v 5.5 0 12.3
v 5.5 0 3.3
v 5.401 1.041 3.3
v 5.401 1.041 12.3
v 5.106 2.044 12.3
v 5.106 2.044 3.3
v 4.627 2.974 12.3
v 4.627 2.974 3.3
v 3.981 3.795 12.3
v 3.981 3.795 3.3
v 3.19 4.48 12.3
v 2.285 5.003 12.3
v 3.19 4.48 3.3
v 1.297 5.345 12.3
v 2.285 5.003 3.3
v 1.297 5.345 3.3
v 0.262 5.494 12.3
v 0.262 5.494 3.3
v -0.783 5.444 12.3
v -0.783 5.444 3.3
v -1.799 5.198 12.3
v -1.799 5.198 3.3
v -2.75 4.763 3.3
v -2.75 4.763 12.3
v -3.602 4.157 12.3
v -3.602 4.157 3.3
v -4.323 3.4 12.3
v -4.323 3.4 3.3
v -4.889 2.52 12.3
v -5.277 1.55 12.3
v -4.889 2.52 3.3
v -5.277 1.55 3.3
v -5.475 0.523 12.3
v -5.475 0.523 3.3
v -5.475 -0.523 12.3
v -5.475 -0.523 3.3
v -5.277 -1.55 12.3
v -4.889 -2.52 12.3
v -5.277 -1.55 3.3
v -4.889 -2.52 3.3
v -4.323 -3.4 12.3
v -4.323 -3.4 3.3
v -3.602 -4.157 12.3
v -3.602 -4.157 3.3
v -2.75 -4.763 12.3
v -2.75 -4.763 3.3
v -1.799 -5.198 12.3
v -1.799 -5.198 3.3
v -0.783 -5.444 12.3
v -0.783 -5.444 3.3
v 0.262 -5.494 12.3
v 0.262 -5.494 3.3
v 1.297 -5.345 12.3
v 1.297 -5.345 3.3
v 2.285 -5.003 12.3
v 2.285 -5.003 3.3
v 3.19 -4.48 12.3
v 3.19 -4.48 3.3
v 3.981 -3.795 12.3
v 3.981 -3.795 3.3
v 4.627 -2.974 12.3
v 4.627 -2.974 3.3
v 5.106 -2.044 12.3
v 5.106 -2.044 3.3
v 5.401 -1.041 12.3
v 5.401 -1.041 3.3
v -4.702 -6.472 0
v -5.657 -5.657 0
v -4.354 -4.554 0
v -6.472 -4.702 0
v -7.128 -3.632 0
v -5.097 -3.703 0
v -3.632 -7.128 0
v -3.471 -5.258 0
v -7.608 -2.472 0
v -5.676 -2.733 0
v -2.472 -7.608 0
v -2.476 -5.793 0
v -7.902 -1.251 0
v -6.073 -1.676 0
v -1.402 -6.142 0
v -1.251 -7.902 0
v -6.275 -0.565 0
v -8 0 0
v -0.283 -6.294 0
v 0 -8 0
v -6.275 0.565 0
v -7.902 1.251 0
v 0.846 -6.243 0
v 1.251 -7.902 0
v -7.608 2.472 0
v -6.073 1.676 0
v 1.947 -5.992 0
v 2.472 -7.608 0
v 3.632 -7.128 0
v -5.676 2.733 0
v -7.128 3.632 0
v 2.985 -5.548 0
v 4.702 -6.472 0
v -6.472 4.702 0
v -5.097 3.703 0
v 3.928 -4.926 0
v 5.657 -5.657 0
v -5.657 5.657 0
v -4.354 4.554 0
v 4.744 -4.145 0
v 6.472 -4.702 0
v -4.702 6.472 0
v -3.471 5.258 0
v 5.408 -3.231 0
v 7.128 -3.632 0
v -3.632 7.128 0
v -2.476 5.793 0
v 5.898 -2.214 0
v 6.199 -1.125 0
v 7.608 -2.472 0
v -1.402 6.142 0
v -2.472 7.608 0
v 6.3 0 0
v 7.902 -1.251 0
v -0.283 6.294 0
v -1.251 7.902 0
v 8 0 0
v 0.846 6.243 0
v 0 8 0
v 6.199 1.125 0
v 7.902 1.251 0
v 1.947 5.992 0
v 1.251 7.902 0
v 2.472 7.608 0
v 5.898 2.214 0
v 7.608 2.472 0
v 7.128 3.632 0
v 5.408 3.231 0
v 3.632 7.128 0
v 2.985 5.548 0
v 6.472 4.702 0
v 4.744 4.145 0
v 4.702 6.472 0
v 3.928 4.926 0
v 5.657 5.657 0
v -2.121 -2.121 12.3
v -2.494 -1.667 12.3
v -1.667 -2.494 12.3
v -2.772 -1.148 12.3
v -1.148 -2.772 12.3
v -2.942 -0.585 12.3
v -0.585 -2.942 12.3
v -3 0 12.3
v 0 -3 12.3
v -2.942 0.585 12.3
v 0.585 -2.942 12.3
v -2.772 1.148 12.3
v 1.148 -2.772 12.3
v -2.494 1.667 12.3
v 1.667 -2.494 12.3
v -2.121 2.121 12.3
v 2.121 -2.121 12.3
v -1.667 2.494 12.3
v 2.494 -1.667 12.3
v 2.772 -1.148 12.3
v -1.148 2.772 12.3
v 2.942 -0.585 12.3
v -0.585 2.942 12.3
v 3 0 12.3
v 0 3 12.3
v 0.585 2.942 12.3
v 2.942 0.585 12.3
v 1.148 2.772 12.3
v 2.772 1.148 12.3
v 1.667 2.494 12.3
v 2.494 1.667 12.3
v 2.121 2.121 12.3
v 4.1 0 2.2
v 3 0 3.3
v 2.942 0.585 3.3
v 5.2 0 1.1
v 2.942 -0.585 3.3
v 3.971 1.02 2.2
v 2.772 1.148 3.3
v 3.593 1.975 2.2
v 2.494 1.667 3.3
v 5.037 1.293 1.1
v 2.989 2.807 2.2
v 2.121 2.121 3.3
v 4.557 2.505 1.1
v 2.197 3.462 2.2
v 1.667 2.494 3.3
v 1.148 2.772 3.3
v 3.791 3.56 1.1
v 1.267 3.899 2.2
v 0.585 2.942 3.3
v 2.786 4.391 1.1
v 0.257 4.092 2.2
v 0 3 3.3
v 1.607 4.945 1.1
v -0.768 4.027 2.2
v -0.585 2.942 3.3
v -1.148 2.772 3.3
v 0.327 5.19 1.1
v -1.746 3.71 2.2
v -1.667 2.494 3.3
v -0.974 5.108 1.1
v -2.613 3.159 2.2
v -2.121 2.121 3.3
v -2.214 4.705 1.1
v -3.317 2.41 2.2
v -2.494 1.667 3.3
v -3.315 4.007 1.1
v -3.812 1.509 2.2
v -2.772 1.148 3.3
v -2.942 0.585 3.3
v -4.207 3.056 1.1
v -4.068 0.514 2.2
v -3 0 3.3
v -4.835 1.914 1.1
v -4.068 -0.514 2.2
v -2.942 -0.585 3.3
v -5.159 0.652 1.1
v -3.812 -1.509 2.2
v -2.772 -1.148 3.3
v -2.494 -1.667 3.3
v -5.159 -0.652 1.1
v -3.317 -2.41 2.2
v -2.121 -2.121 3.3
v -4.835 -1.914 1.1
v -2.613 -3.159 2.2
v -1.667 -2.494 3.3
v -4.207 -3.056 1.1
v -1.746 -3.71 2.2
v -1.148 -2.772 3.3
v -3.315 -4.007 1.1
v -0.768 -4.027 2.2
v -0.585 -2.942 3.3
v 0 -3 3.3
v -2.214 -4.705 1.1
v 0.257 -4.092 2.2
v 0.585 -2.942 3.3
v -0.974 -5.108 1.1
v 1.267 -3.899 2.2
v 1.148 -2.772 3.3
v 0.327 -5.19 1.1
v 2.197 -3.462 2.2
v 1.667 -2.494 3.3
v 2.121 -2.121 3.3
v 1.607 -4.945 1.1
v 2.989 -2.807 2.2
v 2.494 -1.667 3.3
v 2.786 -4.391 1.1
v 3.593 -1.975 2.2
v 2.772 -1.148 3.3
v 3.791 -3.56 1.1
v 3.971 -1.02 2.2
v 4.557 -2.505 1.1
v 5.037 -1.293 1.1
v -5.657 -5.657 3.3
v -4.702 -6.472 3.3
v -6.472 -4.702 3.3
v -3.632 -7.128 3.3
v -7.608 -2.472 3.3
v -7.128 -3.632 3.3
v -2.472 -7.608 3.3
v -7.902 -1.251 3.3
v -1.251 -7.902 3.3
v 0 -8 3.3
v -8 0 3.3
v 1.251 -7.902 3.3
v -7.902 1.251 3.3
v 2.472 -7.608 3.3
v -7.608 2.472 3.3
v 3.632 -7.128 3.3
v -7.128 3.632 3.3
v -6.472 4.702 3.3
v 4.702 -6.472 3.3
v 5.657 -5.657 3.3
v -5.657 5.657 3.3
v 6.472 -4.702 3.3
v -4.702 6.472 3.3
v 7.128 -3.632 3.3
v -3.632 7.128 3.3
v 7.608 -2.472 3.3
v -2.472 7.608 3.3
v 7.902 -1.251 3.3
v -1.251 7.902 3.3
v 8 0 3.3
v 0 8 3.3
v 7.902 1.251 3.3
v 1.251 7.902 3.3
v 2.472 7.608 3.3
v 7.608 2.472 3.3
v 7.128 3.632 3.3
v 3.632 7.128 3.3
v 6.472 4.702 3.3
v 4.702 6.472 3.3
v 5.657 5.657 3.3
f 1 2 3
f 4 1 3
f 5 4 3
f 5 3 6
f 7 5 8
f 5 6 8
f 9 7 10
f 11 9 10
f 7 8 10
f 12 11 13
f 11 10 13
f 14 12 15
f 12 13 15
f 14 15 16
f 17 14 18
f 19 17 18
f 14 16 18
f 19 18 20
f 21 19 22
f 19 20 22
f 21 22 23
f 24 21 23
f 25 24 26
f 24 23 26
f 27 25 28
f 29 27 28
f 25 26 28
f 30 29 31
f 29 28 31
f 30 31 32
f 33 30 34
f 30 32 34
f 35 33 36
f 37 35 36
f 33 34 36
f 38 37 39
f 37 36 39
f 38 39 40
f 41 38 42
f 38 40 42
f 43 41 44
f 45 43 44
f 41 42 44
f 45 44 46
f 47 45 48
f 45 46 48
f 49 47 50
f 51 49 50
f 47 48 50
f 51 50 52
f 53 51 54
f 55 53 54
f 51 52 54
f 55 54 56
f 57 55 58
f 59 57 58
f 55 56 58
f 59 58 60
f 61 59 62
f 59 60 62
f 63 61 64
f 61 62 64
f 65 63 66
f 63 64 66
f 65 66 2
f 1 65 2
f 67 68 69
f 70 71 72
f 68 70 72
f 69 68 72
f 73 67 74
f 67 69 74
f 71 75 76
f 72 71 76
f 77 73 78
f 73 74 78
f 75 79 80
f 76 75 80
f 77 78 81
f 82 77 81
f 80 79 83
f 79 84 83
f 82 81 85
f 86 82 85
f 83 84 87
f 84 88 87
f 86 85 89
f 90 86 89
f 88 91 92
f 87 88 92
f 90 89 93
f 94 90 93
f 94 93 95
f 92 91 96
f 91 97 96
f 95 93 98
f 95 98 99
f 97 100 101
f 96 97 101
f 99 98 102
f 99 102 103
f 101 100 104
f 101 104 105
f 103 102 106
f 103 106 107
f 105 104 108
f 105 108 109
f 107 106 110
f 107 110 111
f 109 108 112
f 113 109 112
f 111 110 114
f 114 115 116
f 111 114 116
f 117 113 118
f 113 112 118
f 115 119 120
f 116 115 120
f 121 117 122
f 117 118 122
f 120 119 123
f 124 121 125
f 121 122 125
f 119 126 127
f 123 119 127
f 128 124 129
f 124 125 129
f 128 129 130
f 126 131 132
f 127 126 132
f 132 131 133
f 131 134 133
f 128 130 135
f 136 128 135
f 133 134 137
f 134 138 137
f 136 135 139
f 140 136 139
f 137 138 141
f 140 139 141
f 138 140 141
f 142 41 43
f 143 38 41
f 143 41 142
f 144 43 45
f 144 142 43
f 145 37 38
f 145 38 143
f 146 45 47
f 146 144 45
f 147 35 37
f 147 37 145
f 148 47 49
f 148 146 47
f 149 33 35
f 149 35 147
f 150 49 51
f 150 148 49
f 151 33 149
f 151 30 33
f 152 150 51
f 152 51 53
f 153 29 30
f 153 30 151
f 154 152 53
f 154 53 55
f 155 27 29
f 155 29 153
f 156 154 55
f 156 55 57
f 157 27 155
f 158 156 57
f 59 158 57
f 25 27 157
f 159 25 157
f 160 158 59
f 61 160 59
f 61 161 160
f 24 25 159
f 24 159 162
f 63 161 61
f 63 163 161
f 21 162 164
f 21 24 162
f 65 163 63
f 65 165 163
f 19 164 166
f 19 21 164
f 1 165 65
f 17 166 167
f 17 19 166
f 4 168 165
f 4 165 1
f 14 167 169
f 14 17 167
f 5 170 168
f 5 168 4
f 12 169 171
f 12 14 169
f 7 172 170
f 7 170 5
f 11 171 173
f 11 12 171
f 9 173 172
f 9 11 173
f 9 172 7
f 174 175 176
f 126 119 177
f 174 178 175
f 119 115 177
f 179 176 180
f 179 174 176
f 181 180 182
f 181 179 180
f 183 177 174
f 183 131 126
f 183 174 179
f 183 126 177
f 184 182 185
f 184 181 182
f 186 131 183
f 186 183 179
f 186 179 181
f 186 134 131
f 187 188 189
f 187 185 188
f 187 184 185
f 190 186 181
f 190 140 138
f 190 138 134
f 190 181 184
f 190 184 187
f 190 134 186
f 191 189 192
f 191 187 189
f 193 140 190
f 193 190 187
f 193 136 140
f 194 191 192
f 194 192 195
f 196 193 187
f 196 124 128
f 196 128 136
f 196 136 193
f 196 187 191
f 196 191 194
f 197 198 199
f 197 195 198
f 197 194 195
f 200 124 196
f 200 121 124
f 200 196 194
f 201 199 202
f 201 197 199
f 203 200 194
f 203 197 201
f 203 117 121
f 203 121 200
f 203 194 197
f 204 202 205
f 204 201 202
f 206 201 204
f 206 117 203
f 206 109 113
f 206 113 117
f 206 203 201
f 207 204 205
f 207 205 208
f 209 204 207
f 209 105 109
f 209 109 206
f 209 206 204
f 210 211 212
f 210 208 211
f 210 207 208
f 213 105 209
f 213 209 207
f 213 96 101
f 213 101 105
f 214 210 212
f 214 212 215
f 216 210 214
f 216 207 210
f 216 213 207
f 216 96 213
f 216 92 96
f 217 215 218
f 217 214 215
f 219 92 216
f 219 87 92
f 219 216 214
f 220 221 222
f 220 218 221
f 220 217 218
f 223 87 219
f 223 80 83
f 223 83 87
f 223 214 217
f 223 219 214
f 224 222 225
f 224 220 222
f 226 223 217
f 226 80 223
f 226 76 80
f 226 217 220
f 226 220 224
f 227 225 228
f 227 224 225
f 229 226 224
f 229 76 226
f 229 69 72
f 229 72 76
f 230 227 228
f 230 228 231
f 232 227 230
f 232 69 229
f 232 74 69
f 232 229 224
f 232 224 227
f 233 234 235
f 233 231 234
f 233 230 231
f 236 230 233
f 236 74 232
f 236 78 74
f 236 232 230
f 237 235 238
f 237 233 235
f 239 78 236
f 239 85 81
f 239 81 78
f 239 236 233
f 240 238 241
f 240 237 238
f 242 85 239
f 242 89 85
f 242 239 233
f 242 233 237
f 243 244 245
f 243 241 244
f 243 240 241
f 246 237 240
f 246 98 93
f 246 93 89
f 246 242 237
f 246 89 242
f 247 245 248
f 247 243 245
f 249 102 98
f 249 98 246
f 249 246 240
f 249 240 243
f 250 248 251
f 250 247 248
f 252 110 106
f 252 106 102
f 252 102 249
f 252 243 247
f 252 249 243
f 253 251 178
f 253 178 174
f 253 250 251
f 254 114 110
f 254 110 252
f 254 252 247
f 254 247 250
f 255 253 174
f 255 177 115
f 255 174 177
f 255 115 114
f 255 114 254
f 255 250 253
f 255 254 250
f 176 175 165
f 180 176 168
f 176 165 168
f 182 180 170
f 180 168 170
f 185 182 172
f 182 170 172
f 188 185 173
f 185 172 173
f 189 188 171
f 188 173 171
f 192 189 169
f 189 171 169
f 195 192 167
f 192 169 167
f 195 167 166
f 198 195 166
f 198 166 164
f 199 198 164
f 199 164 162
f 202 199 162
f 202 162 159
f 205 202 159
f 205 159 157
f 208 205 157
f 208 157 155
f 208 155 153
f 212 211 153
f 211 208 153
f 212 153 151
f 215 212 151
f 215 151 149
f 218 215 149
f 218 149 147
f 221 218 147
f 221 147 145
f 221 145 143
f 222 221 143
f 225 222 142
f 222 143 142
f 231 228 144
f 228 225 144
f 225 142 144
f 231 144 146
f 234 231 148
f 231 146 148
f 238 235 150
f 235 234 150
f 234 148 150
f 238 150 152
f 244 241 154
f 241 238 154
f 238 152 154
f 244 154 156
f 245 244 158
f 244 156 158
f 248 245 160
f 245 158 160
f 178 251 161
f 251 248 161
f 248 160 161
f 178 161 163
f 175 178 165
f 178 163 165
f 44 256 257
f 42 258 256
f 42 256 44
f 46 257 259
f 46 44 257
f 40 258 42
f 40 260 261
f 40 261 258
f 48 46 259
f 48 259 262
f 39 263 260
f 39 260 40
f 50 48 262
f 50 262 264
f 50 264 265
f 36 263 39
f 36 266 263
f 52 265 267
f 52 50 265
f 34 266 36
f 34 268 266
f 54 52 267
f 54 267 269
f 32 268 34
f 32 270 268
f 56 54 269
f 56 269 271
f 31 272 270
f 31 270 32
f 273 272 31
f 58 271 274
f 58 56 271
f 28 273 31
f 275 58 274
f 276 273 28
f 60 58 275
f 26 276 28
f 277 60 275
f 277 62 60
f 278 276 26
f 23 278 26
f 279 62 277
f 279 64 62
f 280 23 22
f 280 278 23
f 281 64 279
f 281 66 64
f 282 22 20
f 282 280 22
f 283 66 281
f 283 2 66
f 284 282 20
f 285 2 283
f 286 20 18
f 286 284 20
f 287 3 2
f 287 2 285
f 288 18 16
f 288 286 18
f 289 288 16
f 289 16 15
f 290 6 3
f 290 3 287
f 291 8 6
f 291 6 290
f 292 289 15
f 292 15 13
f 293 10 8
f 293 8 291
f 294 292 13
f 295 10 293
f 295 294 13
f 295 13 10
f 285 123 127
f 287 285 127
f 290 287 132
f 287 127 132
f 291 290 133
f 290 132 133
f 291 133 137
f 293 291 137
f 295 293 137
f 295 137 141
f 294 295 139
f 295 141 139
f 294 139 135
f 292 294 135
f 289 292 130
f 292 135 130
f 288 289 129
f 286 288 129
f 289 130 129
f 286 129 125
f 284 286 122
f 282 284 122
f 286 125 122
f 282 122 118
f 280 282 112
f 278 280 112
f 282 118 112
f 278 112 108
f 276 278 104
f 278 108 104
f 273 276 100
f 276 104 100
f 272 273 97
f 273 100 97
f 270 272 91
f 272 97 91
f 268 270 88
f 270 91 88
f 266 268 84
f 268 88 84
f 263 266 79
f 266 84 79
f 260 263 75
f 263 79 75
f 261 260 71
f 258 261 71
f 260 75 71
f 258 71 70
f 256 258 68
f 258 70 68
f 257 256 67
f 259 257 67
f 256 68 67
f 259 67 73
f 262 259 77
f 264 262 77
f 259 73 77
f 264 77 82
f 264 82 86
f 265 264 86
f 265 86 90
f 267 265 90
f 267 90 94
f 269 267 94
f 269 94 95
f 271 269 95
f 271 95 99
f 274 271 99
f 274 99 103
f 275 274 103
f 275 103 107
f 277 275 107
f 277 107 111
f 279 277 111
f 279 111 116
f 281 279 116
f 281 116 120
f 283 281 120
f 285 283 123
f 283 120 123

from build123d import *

# Parameters (mm, degrees)
SKETCH1_R           = 8
BOSS_EXTRUDE1_DEPTH = 3.3
SKETCH2_R           = 5.5
BOSS_EXTRUDE2_DEPTH = 9
SKETCH3_R           = 3
CUT_EXTRUDE3_DEPTH  = 4.3
CUT_EXTRUDE3_TAPER  = -45
SKETCH4_R           = 3
CUT_EXTRUDE4_DEPTH  = 13.3000001


with BuildPart() as part:
    # Sketch1 → Boss-Extrude1 (new body)
    with BuildSketch(Plane.XY):
        Circle(SKETCH1_R)
    extrude(amount=BOSS_EXTRUDE1_DEPTH)

    # Sketch2 → Boss-Extrude2 (add)
    with BuildSketch(Plane.XY.offset(3.3)):
        Circle(SKETCH2_R)
    extrude(amount=BOSS_EXTRUDE2_DEPTH)

    # Sketch3 → Cut-Extrude3 (cut, through all)
    with BuildSketch(Plane.XY.offset(3.3)):
        Circle(SKETCH3_R)
    extrude(amount=-CUT_EXTRUDE3_DEPTH, taper=CUT_EXTRUDE3_TAPER, mode=Mode.SUBTRACT)

    # Sketch4 → Cut-Extrude4 (cut, through all)
    with BuildSketch(Plane.XY.offset(12.3)):
        Circle(SKETCH4_R)
    extrude(amount=-CUT_EXTRUDE4_DEPTH, mode=Mode.SUBTRACT)


solid = part.part
